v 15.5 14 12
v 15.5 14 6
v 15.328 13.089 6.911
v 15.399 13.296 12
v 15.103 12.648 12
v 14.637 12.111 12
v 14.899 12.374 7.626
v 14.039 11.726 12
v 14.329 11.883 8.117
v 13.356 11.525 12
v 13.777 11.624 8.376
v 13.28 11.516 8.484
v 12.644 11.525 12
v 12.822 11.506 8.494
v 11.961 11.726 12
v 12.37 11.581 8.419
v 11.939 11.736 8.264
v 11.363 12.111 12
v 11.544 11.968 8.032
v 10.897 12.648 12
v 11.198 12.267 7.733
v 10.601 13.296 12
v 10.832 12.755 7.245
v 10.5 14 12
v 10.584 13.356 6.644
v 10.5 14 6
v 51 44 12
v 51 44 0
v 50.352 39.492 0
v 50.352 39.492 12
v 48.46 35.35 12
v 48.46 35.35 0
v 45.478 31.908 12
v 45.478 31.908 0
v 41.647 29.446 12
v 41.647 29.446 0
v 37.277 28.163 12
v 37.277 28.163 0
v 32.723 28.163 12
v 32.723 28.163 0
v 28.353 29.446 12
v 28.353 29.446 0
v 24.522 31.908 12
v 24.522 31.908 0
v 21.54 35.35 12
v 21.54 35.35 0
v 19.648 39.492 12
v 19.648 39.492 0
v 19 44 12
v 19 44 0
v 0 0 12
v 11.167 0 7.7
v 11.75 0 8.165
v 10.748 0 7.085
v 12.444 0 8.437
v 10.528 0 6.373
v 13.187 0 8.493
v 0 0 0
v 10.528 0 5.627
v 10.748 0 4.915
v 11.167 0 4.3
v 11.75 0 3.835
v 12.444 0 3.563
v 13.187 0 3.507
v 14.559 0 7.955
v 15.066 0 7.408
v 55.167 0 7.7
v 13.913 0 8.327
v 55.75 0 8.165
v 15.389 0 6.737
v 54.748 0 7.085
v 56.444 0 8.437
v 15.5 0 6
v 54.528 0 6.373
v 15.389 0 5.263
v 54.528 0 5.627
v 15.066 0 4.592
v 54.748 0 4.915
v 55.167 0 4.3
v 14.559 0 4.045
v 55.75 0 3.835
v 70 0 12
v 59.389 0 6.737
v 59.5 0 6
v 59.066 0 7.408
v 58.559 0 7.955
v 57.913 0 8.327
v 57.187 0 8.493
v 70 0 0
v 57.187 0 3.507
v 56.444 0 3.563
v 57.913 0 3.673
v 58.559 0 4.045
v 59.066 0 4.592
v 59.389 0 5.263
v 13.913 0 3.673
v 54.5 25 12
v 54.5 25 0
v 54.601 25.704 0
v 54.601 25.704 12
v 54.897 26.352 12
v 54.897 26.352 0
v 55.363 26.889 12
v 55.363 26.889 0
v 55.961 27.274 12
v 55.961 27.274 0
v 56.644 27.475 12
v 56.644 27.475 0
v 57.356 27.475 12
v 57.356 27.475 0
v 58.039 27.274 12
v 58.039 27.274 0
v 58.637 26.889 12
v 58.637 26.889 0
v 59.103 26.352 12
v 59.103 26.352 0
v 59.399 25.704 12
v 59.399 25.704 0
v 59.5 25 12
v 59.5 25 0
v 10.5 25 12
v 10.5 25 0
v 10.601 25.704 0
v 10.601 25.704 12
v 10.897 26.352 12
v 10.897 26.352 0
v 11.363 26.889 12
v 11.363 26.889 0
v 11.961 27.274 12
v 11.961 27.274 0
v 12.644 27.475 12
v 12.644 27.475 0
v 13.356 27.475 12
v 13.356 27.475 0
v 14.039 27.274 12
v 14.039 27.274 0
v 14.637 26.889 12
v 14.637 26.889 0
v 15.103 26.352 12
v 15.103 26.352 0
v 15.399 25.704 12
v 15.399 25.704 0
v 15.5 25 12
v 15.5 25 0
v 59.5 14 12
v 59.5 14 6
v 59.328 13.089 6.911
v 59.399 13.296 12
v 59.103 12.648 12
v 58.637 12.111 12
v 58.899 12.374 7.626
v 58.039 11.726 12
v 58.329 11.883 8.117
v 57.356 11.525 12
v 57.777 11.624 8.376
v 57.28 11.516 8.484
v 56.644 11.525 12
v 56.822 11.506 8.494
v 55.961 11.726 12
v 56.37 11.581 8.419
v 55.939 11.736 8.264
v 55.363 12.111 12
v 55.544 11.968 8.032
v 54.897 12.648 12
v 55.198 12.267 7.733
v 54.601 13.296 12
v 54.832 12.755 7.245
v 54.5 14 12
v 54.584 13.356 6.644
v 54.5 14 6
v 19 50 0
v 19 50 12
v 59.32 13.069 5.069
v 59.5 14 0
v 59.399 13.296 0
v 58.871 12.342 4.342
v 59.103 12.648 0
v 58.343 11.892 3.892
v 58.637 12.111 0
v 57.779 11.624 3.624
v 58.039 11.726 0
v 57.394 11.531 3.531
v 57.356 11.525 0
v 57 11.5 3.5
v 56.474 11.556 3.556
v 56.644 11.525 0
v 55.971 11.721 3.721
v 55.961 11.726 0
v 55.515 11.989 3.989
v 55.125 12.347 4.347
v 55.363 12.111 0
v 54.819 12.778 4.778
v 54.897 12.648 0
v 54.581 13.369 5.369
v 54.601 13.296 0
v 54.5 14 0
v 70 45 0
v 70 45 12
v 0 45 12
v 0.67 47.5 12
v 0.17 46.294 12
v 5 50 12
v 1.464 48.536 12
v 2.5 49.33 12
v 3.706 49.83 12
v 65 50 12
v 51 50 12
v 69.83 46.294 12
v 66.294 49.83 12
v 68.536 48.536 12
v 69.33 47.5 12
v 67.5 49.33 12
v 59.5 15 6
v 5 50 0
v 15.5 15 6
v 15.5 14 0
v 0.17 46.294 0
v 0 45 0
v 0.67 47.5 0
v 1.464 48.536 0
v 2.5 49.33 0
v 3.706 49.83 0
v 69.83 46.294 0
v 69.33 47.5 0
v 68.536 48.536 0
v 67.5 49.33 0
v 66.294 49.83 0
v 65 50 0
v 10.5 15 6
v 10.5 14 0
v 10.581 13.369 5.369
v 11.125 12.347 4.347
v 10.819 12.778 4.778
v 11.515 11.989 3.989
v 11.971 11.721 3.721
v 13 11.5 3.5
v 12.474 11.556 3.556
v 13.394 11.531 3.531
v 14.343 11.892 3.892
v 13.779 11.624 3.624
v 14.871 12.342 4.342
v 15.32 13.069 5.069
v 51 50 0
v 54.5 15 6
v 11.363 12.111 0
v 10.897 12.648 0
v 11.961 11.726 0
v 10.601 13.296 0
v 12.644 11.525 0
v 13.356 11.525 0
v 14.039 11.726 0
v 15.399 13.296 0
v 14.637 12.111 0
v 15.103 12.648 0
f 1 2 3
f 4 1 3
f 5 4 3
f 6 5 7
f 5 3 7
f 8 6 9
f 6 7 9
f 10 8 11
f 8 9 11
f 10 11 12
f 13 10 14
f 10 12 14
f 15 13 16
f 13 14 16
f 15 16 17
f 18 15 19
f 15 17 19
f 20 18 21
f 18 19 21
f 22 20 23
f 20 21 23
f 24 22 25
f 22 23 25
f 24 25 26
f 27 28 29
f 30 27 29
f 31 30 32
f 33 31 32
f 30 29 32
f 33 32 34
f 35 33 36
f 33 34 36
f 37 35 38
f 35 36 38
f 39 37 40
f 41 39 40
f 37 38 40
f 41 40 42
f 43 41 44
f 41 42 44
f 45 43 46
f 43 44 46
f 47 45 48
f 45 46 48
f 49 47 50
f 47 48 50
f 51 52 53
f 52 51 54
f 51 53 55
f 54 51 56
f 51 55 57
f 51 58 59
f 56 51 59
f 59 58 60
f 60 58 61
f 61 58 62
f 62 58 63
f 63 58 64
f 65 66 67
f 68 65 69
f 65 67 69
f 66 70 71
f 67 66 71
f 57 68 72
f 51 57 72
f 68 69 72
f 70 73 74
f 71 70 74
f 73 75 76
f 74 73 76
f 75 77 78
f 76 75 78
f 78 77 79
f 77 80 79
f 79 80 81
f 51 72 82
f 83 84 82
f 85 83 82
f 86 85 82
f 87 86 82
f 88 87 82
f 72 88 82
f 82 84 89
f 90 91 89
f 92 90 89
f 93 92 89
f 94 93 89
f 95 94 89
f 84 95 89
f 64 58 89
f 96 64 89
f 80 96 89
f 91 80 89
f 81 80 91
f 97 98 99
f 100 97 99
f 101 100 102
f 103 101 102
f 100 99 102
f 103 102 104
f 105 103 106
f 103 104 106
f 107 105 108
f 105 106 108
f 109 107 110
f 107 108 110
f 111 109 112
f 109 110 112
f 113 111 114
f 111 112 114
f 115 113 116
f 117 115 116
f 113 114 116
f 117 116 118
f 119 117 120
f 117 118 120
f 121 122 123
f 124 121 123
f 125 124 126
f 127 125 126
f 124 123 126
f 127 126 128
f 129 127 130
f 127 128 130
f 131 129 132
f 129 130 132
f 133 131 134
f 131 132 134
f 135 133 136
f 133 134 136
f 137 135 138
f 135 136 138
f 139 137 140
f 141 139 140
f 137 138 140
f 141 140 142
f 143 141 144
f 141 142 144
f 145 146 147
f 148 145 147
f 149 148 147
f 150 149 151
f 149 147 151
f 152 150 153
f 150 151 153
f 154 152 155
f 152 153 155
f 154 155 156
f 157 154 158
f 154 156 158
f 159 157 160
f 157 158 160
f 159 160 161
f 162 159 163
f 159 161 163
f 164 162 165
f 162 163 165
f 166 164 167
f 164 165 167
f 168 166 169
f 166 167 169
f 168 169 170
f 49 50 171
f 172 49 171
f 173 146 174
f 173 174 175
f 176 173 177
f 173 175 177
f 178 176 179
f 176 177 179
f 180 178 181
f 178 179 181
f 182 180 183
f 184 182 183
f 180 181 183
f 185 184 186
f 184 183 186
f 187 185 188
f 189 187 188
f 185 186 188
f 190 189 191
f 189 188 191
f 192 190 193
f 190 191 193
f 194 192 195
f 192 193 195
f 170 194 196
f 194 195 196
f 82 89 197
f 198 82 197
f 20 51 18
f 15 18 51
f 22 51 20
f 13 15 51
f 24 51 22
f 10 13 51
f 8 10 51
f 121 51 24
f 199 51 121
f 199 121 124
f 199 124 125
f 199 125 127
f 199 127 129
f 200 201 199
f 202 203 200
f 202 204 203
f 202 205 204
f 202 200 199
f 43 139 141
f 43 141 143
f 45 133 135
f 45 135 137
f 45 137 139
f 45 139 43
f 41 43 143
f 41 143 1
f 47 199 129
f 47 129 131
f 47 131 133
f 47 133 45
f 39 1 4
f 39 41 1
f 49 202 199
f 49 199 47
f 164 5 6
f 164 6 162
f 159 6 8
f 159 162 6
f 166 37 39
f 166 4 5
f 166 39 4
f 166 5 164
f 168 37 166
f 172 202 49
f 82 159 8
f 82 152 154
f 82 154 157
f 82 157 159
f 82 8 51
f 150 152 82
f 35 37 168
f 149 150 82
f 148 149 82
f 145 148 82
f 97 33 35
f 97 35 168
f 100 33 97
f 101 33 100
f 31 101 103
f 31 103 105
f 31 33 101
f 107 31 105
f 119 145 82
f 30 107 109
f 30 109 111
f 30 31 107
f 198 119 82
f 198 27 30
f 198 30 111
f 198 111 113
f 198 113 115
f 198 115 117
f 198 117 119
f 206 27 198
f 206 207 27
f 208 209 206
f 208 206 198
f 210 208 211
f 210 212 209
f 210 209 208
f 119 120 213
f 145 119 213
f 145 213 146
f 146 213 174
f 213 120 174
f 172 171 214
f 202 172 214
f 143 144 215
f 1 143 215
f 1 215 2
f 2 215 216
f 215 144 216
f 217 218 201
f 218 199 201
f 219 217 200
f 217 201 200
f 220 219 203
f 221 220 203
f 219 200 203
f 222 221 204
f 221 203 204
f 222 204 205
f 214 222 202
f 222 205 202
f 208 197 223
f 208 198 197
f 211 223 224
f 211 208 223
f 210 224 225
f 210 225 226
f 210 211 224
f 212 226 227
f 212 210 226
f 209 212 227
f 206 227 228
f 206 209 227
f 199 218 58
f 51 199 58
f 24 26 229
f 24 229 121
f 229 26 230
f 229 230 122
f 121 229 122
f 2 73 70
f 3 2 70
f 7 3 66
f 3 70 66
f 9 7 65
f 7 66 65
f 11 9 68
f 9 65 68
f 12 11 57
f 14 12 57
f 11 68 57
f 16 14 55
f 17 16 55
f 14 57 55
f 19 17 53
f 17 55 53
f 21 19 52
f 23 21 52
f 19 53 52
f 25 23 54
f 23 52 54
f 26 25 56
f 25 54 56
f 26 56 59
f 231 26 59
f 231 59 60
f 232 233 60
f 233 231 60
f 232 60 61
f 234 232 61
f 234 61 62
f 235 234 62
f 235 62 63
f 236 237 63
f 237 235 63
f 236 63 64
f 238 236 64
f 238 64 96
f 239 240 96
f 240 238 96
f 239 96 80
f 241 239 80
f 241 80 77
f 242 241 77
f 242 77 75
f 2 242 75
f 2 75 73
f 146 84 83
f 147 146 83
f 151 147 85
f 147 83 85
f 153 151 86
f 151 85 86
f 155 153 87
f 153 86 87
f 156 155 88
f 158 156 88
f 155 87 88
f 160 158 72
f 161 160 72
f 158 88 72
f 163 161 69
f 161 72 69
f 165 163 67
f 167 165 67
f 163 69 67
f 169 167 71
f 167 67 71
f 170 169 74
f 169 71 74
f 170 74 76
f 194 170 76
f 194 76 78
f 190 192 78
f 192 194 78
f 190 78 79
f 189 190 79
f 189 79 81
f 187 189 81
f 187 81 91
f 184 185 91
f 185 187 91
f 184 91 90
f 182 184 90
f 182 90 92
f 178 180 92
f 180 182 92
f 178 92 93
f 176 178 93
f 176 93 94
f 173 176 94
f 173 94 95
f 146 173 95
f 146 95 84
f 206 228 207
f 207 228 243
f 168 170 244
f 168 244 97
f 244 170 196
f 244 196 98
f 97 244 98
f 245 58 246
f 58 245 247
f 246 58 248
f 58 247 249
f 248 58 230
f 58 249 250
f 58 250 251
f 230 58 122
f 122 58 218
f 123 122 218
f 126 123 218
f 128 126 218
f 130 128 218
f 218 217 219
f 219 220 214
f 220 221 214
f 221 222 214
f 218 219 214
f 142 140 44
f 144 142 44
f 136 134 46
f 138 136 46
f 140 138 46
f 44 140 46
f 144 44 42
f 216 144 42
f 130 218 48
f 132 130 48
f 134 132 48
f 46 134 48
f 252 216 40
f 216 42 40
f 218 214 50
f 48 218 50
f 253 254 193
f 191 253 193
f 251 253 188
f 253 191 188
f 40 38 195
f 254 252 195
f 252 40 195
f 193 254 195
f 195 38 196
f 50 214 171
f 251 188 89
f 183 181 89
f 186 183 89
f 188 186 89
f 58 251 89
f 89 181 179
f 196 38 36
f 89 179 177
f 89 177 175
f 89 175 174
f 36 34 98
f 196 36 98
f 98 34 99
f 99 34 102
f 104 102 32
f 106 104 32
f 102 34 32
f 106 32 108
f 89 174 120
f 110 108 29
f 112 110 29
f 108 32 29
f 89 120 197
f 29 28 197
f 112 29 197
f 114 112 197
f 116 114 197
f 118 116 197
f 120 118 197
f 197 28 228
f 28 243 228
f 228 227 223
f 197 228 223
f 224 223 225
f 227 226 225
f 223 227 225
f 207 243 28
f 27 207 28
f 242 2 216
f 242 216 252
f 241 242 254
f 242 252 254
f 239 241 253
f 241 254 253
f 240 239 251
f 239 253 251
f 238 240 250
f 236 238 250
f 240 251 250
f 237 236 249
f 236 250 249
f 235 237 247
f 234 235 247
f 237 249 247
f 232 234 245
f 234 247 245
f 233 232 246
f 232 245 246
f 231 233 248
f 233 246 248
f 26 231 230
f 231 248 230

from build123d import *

# Parameters (mm, degrees)
F1_DEPTH = 12
F2_R     = 2.5
F3_DEPTH = 15
F4_R     = 5


with BuildPart() as f1:
    # F0 (on Top) → F1 (new body)
    with BuildSketch(Plane.XY):
        with BuildLine():
            Line((0, 0), (35, 0))
            Line((35, 0), (70, 0))
            Line((70, 0), (70, 50))
            Line((70, 50), (51, 50))
            Line((51, 50), (51, 44))
            ThreePointArc((51, 44), (35, 28), (19, 44))
            Line((19, 44), (19, 50))
            Line((19, 50), (0, 50))
            Line((0, 50), (0, 0))
        make_face()
        with BuildLine():
            Line((15.5, 25), (15.5, 14))
            ThreePointArc((15.5, 14), (13, 11.5), (10.5, 14))
            Line((10.5, 14), (10.5, 25))
            ThreePointArc((10.5, 25), (13, 27.5), (15.5, 25))
        make_face(mode=Mode.SUBTRACT)
        with BuildLine():
            Line((59.5, 25), (59.5, 14))
            ThreePointArc((59.5, 14), (57, 11.5), (54.5, 14))
            Line((54.5, 14), (54.5, 25))
            ThreePointArc((54.5, 25), (57, 27.5), (59.5, 25))
        make_face(mode=Mode.SUBTRACT)
    extrude(amount=F1_DEPTH)

    # F2 (on face) → F3 (cut)
    with BuildSketch(Plane.XZ):
        with Locations((13, 6)):
            Circle(F2_R)
        with Locations((57, 6)):
            Circle(F2_R)
    extrude(amount=-F3_DEPTH, mode=Mode.SUBTRACT)

    # F4
    f4_edges = [f1.edges().sort_by_distance(p)[0] for p in [
        (70, 50, 6),
        (0, 50, 6),
    ]]
    fillet(f4_edges, radius=F4_R)


solid = f1.part
